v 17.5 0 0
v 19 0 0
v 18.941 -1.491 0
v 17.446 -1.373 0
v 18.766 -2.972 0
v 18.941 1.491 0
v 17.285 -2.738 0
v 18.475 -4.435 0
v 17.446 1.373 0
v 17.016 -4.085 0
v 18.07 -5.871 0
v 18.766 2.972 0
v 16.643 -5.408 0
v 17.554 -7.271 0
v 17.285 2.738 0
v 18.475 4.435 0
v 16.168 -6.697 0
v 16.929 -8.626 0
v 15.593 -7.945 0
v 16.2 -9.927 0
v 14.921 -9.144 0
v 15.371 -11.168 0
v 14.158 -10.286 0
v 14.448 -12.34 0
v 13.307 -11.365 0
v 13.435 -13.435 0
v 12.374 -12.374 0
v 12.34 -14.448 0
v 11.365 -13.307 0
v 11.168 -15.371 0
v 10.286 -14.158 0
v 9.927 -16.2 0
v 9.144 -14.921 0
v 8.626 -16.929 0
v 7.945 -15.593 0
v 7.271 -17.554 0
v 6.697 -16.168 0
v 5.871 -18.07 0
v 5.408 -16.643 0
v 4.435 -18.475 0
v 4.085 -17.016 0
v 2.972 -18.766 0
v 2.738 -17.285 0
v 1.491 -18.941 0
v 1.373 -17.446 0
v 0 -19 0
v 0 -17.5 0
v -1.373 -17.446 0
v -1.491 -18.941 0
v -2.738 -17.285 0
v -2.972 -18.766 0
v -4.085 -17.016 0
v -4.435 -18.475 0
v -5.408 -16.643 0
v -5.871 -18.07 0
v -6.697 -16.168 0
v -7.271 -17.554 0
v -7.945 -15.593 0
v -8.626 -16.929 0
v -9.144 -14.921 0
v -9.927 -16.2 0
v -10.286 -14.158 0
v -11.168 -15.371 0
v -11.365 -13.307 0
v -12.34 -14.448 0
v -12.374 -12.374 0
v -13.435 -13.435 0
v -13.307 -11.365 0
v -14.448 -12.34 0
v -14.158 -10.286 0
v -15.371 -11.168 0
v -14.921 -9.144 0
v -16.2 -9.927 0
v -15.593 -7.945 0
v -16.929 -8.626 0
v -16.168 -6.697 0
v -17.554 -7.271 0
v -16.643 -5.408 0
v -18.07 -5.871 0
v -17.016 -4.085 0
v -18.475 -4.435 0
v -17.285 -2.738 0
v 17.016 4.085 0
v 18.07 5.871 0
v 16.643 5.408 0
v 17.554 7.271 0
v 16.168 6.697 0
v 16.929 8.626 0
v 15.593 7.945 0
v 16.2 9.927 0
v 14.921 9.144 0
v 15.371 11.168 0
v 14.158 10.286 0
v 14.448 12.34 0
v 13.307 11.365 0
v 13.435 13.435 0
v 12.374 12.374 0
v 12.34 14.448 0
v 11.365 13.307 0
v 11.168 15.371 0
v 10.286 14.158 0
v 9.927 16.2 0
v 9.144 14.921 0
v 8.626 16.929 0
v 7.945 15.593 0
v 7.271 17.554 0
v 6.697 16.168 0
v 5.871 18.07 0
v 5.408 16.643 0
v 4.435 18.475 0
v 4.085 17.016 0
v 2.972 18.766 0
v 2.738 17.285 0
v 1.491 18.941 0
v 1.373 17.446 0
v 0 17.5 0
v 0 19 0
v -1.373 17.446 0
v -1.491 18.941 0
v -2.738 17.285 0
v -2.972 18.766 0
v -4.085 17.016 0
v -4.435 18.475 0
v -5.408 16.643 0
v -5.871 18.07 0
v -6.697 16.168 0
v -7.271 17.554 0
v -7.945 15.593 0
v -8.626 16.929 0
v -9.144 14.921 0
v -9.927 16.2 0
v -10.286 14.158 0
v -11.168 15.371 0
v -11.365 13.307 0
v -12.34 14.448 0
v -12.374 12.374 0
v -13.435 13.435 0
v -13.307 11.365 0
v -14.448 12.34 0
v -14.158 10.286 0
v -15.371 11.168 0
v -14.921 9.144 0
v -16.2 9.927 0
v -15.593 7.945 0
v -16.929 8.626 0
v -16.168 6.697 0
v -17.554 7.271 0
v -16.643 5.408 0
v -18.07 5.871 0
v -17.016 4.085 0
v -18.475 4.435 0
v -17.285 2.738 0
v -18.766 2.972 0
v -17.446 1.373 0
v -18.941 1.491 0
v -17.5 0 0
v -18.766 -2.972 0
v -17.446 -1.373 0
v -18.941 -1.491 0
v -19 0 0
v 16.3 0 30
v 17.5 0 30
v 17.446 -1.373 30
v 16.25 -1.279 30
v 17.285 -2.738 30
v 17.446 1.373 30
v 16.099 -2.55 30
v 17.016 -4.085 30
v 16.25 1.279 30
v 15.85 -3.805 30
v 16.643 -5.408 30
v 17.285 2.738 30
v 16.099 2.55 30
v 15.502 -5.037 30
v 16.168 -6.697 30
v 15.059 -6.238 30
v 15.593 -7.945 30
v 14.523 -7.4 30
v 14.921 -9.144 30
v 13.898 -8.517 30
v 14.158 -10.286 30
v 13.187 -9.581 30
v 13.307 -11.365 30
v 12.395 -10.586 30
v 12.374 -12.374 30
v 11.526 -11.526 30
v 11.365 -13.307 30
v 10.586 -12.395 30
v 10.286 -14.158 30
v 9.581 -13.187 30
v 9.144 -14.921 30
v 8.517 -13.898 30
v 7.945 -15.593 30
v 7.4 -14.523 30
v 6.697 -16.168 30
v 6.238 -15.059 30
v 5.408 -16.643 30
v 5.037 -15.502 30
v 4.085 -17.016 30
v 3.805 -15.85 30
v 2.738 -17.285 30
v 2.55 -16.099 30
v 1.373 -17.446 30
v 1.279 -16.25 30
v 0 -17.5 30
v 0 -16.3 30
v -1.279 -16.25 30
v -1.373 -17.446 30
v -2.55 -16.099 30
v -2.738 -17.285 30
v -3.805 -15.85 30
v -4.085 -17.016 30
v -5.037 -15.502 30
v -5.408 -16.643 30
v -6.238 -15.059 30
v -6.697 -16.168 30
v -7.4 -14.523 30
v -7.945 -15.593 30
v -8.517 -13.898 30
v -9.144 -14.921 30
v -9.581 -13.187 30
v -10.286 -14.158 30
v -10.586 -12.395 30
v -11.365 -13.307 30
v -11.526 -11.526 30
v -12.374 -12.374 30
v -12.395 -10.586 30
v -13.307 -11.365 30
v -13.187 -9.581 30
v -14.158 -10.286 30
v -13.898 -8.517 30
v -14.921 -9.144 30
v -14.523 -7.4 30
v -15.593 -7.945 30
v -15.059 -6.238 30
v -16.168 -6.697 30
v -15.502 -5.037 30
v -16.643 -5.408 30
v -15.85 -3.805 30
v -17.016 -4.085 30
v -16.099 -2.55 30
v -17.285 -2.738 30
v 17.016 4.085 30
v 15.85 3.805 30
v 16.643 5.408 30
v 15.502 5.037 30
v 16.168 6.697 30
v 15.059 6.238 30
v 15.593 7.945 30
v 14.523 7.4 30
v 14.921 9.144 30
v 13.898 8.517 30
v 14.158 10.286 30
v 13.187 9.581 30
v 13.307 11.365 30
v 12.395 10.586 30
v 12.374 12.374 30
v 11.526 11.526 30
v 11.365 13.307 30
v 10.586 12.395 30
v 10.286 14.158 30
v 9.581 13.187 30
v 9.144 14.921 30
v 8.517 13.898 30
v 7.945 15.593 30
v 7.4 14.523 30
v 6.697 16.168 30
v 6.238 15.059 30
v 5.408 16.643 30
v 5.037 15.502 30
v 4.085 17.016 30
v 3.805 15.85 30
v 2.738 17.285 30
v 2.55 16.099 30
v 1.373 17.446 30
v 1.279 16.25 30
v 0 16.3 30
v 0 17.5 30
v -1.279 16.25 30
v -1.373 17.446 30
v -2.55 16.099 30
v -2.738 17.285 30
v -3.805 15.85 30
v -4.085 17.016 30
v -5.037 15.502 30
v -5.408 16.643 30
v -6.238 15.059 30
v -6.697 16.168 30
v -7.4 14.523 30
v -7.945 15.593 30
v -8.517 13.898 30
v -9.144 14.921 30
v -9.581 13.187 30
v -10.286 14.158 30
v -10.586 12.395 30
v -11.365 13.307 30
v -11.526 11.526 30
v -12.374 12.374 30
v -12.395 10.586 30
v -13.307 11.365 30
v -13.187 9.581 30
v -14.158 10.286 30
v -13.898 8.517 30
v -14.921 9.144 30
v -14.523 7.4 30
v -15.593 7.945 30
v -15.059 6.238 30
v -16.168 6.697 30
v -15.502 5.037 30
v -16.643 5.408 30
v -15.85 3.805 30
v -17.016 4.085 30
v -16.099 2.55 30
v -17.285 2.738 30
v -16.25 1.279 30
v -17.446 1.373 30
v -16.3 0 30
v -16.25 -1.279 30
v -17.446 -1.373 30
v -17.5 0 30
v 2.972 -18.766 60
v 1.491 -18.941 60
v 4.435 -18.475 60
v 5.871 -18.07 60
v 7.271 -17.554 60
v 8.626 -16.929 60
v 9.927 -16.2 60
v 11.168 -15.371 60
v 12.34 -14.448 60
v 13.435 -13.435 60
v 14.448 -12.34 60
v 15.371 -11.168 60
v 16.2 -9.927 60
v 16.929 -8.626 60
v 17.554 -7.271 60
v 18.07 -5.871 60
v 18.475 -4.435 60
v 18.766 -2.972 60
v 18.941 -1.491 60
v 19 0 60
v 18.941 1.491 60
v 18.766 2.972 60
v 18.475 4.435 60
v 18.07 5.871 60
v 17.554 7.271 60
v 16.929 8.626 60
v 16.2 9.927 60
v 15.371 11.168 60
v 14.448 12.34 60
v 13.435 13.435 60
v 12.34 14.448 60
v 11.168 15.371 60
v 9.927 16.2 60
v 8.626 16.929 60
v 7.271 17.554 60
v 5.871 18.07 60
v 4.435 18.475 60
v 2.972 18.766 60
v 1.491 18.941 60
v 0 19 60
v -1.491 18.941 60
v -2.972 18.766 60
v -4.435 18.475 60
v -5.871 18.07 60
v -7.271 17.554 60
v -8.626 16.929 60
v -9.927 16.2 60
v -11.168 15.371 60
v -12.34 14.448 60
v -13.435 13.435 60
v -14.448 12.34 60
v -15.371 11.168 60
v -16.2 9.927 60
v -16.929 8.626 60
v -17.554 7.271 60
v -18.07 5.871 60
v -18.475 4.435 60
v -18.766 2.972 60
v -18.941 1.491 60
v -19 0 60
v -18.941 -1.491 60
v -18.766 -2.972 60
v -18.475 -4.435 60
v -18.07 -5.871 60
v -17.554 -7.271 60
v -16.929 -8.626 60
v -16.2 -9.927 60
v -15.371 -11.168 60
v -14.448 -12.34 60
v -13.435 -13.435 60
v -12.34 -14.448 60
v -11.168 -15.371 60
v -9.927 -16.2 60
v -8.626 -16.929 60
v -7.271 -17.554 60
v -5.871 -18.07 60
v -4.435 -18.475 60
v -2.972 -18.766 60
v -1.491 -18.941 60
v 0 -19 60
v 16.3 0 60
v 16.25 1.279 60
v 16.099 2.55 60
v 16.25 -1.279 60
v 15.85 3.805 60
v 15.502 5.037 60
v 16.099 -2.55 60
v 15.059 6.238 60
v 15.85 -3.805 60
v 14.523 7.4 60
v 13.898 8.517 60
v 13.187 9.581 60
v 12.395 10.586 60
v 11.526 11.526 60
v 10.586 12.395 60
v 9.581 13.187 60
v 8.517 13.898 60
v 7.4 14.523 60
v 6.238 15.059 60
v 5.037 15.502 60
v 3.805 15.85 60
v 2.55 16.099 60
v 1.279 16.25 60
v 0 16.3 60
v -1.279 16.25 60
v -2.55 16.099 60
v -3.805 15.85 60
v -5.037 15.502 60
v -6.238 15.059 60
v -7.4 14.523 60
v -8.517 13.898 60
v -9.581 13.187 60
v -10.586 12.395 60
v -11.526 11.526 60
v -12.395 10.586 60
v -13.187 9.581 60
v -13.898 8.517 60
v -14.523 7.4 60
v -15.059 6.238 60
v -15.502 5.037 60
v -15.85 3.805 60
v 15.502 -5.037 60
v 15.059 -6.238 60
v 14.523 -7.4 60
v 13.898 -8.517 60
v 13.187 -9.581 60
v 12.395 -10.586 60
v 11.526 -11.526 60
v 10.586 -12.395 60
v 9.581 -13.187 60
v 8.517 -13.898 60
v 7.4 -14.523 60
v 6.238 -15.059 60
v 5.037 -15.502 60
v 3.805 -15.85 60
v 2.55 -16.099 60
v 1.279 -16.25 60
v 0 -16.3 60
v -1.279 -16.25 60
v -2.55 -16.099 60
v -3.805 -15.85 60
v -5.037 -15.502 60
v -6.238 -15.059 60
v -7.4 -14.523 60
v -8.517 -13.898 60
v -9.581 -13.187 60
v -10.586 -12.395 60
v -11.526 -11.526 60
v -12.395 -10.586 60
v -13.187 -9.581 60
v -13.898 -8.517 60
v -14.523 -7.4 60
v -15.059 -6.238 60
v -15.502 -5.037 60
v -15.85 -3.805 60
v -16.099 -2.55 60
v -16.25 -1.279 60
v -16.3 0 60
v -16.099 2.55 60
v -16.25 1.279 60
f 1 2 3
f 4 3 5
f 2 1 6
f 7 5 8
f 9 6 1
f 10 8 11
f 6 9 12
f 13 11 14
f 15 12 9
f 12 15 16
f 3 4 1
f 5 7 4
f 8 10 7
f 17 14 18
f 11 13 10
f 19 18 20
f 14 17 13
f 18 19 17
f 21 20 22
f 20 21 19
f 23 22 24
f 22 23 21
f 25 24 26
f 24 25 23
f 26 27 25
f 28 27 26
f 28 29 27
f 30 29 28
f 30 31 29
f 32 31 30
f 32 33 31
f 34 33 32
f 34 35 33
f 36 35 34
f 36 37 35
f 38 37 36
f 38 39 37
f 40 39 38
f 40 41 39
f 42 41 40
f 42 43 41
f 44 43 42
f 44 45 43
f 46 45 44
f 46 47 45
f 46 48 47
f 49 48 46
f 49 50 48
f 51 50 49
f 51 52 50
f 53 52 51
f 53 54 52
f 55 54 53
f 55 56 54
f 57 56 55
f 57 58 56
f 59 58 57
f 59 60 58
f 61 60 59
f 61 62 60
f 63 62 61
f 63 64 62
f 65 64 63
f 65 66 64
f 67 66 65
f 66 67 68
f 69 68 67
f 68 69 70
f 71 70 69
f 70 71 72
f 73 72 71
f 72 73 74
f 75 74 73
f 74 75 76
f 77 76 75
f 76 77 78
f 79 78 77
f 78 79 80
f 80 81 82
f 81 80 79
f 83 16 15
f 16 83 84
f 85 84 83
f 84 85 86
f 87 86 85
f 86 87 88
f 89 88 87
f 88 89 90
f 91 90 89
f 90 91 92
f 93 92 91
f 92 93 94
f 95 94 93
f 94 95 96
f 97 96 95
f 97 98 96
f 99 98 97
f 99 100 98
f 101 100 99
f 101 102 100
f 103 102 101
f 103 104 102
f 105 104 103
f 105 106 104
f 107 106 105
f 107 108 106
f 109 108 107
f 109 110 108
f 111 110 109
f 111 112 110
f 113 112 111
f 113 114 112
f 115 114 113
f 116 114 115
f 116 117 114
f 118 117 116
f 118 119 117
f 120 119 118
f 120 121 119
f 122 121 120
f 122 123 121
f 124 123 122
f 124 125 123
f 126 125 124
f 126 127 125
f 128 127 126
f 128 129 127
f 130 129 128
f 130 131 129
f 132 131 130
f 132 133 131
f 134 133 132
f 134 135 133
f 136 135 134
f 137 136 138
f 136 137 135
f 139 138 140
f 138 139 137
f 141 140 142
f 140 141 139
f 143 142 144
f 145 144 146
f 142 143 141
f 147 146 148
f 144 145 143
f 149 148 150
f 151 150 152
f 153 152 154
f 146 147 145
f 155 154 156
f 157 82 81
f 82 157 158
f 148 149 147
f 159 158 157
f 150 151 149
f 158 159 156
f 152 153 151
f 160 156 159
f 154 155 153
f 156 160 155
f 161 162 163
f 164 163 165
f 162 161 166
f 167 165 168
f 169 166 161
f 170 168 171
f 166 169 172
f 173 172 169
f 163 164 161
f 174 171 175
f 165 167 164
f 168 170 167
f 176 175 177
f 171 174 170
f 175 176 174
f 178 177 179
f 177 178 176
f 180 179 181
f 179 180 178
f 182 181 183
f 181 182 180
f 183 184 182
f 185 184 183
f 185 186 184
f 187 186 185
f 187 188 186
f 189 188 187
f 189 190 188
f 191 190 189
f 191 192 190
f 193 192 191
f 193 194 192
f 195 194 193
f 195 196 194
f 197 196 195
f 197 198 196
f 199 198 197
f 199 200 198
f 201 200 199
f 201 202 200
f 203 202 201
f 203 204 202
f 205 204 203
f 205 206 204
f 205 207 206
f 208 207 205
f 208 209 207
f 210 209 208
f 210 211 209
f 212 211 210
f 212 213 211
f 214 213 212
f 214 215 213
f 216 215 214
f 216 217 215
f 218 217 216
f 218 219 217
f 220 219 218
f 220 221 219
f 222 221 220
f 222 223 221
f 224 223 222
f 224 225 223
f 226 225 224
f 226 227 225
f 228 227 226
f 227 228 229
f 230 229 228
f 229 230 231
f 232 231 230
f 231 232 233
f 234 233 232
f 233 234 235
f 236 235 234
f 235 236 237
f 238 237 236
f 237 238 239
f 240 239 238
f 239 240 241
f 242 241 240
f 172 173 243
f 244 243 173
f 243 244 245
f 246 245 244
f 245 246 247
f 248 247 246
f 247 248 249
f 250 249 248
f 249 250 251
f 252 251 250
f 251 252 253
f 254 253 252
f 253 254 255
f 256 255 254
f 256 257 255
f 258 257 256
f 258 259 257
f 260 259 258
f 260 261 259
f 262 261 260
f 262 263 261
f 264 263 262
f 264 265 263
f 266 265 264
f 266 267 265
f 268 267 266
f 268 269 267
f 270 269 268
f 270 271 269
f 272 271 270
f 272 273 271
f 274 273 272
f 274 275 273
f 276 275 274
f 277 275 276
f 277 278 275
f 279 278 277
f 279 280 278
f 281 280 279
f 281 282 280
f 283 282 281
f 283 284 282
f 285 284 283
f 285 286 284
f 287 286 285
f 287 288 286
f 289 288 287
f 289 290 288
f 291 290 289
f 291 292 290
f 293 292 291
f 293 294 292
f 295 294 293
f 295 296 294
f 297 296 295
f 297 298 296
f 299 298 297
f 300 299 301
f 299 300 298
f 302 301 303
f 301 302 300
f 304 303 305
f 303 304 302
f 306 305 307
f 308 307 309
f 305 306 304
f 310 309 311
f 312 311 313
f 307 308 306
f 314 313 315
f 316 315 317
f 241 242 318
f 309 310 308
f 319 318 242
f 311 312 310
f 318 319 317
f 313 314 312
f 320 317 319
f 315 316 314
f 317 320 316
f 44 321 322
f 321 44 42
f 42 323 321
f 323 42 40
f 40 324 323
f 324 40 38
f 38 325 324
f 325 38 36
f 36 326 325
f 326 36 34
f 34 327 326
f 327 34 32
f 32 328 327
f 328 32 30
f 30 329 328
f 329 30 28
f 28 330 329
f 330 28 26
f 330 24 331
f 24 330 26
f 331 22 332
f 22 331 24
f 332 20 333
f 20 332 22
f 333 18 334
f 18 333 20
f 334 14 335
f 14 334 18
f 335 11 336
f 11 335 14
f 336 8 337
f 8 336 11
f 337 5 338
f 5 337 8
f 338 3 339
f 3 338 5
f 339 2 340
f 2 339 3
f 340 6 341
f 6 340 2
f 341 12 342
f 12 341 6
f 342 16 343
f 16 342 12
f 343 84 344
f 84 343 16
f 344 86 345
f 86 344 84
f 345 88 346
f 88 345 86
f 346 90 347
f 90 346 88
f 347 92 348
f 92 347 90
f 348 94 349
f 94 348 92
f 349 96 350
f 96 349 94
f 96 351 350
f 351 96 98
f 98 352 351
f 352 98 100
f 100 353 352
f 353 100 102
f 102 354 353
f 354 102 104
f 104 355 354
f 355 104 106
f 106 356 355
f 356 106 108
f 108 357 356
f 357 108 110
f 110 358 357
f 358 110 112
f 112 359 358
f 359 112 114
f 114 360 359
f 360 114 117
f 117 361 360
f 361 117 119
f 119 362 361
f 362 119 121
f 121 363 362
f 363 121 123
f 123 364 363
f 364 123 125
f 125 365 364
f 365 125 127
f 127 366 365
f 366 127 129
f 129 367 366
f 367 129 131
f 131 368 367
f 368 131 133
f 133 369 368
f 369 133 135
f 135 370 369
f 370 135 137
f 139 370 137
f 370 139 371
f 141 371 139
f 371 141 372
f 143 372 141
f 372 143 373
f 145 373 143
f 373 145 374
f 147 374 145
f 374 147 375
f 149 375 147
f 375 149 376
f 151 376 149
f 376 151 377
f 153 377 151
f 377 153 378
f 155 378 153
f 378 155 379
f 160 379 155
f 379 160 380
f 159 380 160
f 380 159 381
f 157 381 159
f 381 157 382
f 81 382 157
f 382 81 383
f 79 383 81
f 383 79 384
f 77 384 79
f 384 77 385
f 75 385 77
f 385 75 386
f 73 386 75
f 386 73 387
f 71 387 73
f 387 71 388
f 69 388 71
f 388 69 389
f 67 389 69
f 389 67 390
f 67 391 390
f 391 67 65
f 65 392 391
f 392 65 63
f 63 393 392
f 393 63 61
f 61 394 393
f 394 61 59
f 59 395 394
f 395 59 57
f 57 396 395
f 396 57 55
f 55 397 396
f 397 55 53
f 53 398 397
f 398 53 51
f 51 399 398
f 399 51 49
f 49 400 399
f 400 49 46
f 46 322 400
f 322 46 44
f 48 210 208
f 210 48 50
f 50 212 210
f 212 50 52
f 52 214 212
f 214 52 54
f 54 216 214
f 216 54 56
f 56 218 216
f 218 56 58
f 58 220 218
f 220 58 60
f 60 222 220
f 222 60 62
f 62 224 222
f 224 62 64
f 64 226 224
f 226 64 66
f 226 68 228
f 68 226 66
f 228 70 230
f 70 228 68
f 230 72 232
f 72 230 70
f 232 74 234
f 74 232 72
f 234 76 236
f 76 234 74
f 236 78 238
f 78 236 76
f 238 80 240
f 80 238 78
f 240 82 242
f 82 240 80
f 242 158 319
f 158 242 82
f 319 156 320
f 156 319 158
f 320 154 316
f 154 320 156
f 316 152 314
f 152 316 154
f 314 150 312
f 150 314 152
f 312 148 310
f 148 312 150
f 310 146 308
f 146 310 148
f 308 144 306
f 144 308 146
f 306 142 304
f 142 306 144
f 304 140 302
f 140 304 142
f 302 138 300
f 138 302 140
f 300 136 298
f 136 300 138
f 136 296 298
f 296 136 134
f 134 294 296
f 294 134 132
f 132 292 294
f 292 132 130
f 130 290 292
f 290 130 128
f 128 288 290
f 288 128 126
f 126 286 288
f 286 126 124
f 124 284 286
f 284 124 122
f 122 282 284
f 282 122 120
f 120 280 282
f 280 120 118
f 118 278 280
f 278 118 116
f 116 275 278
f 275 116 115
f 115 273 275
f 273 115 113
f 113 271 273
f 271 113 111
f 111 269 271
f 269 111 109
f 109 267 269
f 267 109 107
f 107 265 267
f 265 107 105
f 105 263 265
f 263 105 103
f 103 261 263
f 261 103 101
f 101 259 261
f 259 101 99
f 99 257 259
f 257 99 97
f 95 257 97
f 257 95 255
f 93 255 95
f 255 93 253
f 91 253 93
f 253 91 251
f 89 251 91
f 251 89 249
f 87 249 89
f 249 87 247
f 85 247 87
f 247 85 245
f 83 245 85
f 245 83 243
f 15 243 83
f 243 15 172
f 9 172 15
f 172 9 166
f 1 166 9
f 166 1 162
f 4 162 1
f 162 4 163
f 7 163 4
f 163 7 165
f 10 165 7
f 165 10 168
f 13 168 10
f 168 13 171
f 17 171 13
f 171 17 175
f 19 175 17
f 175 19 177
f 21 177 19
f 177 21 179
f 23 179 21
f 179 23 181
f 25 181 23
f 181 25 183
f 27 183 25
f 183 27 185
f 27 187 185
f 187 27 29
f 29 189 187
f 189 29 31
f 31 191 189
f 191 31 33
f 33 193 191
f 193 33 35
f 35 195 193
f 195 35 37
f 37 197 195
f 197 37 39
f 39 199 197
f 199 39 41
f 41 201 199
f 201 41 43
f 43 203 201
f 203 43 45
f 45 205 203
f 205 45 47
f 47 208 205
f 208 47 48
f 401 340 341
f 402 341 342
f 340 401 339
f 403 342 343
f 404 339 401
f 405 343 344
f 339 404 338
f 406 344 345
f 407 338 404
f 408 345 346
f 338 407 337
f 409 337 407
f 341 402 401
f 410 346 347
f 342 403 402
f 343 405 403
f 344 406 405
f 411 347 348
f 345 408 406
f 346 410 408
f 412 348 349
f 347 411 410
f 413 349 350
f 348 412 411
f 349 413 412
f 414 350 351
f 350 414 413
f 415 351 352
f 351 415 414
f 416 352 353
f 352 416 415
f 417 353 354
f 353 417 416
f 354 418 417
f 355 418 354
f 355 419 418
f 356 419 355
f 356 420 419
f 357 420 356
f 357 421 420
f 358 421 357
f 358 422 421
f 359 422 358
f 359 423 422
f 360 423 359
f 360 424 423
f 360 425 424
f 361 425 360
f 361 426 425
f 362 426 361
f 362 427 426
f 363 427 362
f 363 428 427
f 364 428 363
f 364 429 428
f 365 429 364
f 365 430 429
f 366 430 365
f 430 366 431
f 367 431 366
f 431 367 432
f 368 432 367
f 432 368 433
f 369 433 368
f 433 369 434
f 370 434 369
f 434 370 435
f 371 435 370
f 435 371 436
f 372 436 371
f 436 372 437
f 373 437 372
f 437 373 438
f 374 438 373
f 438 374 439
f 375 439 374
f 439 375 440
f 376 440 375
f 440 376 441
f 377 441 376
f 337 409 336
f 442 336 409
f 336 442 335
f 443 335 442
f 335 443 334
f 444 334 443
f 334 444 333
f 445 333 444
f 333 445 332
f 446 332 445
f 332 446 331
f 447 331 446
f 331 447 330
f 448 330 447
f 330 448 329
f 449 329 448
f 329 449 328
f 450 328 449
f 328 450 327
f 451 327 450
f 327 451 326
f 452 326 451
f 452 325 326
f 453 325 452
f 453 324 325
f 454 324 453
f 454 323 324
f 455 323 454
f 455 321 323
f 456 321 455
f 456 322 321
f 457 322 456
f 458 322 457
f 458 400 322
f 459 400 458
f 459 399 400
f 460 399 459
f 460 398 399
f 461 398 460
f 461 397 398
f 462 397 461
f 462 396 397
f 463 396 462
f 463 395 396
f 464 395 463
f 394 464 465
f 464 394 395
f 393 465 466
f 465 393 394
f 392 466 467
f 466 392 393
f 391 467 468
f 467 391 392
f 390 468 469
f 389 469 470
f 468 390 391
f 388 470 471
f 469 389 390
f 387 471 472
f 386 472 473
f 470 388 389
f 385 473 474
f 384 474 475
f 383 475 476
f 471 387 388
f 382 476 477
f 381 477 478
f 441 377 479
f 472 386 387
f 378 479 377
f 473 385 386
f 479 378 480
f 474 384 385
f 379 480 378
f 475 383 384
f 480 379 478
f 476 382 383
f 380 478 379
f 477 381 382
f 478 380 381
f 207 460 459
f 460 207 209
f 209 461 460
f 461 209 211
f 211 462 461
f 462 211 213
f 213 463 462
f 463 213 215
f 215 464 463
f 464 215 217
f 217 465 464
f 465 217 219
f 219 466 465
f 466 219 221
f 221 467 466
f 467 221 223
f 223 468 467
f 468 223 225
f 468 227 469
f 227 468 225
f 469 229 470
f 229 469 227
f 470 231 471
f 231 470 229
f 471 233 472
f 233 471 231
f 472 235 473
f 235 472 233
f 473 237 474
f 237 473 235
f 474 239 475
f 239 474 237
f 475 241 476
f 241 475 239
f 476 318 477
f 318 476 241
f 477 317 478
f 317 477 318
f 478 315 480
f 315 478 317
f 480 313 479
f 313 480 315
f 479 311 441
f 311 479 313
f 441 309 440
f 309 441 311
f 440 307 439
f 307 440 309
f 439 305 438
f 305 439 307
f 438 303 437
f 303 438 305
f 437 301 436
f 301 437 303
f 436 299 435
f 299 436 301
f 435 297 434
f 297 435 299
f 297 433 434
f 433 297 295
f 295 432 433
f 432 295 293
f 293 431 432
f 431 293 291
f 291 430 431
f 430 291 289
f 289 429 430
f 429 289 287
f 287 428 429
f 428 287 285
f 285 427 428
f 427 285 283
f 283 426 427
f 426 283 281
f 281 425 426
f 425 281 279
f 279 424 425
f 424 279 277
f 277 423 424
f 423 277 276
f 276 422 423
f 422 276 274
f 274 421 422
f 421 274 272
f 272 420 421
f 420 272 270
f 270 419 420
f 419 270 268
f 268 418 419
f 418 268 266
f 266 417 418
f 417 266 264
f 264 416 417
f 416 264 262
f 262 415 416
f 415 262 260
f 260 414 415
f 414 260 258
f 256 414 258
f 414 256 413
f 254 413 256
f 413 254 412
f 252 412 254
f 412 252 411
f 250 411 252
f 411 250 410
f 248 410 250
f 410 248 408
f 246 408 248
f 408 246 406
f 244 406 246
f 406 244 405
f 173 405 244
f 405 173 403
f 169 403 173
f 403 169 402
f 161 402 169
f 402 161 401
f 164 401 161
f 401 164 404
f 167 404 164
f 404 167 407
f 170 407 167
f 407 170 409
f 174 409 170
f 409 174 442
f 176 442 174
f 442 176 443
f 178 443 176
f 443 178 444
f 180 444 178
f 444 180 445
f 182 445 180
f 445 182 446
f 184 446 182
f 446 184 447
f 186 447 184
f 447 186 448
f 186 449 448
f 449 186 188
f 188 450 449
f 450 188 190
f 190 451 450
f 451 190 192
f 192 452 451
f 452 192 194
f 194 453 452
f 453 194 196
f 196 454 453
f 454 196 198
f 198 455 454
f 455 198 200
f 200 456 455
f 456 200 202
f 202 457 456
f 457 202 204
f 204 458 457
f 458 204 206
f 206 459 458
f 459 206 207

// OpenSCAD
echo(version=version());
// 35mm & 32.6mm, each 30mm tall
// simple 2D -> 3D extrusion of a rectangle
color("red")
    translate([0, 0, 0])
        linear_extrude(height = 30) {
            difference() {
                circle(38/2,$fn=80);
                circle(35/2,$fn=80);
            }
        }
    translate([0, 0, 30])
        linear_extrude(height = 30) {
            difference() {
                circle(38/2,$fn=80);
                circle(32.6/2,$fn=80);
            }
        }
